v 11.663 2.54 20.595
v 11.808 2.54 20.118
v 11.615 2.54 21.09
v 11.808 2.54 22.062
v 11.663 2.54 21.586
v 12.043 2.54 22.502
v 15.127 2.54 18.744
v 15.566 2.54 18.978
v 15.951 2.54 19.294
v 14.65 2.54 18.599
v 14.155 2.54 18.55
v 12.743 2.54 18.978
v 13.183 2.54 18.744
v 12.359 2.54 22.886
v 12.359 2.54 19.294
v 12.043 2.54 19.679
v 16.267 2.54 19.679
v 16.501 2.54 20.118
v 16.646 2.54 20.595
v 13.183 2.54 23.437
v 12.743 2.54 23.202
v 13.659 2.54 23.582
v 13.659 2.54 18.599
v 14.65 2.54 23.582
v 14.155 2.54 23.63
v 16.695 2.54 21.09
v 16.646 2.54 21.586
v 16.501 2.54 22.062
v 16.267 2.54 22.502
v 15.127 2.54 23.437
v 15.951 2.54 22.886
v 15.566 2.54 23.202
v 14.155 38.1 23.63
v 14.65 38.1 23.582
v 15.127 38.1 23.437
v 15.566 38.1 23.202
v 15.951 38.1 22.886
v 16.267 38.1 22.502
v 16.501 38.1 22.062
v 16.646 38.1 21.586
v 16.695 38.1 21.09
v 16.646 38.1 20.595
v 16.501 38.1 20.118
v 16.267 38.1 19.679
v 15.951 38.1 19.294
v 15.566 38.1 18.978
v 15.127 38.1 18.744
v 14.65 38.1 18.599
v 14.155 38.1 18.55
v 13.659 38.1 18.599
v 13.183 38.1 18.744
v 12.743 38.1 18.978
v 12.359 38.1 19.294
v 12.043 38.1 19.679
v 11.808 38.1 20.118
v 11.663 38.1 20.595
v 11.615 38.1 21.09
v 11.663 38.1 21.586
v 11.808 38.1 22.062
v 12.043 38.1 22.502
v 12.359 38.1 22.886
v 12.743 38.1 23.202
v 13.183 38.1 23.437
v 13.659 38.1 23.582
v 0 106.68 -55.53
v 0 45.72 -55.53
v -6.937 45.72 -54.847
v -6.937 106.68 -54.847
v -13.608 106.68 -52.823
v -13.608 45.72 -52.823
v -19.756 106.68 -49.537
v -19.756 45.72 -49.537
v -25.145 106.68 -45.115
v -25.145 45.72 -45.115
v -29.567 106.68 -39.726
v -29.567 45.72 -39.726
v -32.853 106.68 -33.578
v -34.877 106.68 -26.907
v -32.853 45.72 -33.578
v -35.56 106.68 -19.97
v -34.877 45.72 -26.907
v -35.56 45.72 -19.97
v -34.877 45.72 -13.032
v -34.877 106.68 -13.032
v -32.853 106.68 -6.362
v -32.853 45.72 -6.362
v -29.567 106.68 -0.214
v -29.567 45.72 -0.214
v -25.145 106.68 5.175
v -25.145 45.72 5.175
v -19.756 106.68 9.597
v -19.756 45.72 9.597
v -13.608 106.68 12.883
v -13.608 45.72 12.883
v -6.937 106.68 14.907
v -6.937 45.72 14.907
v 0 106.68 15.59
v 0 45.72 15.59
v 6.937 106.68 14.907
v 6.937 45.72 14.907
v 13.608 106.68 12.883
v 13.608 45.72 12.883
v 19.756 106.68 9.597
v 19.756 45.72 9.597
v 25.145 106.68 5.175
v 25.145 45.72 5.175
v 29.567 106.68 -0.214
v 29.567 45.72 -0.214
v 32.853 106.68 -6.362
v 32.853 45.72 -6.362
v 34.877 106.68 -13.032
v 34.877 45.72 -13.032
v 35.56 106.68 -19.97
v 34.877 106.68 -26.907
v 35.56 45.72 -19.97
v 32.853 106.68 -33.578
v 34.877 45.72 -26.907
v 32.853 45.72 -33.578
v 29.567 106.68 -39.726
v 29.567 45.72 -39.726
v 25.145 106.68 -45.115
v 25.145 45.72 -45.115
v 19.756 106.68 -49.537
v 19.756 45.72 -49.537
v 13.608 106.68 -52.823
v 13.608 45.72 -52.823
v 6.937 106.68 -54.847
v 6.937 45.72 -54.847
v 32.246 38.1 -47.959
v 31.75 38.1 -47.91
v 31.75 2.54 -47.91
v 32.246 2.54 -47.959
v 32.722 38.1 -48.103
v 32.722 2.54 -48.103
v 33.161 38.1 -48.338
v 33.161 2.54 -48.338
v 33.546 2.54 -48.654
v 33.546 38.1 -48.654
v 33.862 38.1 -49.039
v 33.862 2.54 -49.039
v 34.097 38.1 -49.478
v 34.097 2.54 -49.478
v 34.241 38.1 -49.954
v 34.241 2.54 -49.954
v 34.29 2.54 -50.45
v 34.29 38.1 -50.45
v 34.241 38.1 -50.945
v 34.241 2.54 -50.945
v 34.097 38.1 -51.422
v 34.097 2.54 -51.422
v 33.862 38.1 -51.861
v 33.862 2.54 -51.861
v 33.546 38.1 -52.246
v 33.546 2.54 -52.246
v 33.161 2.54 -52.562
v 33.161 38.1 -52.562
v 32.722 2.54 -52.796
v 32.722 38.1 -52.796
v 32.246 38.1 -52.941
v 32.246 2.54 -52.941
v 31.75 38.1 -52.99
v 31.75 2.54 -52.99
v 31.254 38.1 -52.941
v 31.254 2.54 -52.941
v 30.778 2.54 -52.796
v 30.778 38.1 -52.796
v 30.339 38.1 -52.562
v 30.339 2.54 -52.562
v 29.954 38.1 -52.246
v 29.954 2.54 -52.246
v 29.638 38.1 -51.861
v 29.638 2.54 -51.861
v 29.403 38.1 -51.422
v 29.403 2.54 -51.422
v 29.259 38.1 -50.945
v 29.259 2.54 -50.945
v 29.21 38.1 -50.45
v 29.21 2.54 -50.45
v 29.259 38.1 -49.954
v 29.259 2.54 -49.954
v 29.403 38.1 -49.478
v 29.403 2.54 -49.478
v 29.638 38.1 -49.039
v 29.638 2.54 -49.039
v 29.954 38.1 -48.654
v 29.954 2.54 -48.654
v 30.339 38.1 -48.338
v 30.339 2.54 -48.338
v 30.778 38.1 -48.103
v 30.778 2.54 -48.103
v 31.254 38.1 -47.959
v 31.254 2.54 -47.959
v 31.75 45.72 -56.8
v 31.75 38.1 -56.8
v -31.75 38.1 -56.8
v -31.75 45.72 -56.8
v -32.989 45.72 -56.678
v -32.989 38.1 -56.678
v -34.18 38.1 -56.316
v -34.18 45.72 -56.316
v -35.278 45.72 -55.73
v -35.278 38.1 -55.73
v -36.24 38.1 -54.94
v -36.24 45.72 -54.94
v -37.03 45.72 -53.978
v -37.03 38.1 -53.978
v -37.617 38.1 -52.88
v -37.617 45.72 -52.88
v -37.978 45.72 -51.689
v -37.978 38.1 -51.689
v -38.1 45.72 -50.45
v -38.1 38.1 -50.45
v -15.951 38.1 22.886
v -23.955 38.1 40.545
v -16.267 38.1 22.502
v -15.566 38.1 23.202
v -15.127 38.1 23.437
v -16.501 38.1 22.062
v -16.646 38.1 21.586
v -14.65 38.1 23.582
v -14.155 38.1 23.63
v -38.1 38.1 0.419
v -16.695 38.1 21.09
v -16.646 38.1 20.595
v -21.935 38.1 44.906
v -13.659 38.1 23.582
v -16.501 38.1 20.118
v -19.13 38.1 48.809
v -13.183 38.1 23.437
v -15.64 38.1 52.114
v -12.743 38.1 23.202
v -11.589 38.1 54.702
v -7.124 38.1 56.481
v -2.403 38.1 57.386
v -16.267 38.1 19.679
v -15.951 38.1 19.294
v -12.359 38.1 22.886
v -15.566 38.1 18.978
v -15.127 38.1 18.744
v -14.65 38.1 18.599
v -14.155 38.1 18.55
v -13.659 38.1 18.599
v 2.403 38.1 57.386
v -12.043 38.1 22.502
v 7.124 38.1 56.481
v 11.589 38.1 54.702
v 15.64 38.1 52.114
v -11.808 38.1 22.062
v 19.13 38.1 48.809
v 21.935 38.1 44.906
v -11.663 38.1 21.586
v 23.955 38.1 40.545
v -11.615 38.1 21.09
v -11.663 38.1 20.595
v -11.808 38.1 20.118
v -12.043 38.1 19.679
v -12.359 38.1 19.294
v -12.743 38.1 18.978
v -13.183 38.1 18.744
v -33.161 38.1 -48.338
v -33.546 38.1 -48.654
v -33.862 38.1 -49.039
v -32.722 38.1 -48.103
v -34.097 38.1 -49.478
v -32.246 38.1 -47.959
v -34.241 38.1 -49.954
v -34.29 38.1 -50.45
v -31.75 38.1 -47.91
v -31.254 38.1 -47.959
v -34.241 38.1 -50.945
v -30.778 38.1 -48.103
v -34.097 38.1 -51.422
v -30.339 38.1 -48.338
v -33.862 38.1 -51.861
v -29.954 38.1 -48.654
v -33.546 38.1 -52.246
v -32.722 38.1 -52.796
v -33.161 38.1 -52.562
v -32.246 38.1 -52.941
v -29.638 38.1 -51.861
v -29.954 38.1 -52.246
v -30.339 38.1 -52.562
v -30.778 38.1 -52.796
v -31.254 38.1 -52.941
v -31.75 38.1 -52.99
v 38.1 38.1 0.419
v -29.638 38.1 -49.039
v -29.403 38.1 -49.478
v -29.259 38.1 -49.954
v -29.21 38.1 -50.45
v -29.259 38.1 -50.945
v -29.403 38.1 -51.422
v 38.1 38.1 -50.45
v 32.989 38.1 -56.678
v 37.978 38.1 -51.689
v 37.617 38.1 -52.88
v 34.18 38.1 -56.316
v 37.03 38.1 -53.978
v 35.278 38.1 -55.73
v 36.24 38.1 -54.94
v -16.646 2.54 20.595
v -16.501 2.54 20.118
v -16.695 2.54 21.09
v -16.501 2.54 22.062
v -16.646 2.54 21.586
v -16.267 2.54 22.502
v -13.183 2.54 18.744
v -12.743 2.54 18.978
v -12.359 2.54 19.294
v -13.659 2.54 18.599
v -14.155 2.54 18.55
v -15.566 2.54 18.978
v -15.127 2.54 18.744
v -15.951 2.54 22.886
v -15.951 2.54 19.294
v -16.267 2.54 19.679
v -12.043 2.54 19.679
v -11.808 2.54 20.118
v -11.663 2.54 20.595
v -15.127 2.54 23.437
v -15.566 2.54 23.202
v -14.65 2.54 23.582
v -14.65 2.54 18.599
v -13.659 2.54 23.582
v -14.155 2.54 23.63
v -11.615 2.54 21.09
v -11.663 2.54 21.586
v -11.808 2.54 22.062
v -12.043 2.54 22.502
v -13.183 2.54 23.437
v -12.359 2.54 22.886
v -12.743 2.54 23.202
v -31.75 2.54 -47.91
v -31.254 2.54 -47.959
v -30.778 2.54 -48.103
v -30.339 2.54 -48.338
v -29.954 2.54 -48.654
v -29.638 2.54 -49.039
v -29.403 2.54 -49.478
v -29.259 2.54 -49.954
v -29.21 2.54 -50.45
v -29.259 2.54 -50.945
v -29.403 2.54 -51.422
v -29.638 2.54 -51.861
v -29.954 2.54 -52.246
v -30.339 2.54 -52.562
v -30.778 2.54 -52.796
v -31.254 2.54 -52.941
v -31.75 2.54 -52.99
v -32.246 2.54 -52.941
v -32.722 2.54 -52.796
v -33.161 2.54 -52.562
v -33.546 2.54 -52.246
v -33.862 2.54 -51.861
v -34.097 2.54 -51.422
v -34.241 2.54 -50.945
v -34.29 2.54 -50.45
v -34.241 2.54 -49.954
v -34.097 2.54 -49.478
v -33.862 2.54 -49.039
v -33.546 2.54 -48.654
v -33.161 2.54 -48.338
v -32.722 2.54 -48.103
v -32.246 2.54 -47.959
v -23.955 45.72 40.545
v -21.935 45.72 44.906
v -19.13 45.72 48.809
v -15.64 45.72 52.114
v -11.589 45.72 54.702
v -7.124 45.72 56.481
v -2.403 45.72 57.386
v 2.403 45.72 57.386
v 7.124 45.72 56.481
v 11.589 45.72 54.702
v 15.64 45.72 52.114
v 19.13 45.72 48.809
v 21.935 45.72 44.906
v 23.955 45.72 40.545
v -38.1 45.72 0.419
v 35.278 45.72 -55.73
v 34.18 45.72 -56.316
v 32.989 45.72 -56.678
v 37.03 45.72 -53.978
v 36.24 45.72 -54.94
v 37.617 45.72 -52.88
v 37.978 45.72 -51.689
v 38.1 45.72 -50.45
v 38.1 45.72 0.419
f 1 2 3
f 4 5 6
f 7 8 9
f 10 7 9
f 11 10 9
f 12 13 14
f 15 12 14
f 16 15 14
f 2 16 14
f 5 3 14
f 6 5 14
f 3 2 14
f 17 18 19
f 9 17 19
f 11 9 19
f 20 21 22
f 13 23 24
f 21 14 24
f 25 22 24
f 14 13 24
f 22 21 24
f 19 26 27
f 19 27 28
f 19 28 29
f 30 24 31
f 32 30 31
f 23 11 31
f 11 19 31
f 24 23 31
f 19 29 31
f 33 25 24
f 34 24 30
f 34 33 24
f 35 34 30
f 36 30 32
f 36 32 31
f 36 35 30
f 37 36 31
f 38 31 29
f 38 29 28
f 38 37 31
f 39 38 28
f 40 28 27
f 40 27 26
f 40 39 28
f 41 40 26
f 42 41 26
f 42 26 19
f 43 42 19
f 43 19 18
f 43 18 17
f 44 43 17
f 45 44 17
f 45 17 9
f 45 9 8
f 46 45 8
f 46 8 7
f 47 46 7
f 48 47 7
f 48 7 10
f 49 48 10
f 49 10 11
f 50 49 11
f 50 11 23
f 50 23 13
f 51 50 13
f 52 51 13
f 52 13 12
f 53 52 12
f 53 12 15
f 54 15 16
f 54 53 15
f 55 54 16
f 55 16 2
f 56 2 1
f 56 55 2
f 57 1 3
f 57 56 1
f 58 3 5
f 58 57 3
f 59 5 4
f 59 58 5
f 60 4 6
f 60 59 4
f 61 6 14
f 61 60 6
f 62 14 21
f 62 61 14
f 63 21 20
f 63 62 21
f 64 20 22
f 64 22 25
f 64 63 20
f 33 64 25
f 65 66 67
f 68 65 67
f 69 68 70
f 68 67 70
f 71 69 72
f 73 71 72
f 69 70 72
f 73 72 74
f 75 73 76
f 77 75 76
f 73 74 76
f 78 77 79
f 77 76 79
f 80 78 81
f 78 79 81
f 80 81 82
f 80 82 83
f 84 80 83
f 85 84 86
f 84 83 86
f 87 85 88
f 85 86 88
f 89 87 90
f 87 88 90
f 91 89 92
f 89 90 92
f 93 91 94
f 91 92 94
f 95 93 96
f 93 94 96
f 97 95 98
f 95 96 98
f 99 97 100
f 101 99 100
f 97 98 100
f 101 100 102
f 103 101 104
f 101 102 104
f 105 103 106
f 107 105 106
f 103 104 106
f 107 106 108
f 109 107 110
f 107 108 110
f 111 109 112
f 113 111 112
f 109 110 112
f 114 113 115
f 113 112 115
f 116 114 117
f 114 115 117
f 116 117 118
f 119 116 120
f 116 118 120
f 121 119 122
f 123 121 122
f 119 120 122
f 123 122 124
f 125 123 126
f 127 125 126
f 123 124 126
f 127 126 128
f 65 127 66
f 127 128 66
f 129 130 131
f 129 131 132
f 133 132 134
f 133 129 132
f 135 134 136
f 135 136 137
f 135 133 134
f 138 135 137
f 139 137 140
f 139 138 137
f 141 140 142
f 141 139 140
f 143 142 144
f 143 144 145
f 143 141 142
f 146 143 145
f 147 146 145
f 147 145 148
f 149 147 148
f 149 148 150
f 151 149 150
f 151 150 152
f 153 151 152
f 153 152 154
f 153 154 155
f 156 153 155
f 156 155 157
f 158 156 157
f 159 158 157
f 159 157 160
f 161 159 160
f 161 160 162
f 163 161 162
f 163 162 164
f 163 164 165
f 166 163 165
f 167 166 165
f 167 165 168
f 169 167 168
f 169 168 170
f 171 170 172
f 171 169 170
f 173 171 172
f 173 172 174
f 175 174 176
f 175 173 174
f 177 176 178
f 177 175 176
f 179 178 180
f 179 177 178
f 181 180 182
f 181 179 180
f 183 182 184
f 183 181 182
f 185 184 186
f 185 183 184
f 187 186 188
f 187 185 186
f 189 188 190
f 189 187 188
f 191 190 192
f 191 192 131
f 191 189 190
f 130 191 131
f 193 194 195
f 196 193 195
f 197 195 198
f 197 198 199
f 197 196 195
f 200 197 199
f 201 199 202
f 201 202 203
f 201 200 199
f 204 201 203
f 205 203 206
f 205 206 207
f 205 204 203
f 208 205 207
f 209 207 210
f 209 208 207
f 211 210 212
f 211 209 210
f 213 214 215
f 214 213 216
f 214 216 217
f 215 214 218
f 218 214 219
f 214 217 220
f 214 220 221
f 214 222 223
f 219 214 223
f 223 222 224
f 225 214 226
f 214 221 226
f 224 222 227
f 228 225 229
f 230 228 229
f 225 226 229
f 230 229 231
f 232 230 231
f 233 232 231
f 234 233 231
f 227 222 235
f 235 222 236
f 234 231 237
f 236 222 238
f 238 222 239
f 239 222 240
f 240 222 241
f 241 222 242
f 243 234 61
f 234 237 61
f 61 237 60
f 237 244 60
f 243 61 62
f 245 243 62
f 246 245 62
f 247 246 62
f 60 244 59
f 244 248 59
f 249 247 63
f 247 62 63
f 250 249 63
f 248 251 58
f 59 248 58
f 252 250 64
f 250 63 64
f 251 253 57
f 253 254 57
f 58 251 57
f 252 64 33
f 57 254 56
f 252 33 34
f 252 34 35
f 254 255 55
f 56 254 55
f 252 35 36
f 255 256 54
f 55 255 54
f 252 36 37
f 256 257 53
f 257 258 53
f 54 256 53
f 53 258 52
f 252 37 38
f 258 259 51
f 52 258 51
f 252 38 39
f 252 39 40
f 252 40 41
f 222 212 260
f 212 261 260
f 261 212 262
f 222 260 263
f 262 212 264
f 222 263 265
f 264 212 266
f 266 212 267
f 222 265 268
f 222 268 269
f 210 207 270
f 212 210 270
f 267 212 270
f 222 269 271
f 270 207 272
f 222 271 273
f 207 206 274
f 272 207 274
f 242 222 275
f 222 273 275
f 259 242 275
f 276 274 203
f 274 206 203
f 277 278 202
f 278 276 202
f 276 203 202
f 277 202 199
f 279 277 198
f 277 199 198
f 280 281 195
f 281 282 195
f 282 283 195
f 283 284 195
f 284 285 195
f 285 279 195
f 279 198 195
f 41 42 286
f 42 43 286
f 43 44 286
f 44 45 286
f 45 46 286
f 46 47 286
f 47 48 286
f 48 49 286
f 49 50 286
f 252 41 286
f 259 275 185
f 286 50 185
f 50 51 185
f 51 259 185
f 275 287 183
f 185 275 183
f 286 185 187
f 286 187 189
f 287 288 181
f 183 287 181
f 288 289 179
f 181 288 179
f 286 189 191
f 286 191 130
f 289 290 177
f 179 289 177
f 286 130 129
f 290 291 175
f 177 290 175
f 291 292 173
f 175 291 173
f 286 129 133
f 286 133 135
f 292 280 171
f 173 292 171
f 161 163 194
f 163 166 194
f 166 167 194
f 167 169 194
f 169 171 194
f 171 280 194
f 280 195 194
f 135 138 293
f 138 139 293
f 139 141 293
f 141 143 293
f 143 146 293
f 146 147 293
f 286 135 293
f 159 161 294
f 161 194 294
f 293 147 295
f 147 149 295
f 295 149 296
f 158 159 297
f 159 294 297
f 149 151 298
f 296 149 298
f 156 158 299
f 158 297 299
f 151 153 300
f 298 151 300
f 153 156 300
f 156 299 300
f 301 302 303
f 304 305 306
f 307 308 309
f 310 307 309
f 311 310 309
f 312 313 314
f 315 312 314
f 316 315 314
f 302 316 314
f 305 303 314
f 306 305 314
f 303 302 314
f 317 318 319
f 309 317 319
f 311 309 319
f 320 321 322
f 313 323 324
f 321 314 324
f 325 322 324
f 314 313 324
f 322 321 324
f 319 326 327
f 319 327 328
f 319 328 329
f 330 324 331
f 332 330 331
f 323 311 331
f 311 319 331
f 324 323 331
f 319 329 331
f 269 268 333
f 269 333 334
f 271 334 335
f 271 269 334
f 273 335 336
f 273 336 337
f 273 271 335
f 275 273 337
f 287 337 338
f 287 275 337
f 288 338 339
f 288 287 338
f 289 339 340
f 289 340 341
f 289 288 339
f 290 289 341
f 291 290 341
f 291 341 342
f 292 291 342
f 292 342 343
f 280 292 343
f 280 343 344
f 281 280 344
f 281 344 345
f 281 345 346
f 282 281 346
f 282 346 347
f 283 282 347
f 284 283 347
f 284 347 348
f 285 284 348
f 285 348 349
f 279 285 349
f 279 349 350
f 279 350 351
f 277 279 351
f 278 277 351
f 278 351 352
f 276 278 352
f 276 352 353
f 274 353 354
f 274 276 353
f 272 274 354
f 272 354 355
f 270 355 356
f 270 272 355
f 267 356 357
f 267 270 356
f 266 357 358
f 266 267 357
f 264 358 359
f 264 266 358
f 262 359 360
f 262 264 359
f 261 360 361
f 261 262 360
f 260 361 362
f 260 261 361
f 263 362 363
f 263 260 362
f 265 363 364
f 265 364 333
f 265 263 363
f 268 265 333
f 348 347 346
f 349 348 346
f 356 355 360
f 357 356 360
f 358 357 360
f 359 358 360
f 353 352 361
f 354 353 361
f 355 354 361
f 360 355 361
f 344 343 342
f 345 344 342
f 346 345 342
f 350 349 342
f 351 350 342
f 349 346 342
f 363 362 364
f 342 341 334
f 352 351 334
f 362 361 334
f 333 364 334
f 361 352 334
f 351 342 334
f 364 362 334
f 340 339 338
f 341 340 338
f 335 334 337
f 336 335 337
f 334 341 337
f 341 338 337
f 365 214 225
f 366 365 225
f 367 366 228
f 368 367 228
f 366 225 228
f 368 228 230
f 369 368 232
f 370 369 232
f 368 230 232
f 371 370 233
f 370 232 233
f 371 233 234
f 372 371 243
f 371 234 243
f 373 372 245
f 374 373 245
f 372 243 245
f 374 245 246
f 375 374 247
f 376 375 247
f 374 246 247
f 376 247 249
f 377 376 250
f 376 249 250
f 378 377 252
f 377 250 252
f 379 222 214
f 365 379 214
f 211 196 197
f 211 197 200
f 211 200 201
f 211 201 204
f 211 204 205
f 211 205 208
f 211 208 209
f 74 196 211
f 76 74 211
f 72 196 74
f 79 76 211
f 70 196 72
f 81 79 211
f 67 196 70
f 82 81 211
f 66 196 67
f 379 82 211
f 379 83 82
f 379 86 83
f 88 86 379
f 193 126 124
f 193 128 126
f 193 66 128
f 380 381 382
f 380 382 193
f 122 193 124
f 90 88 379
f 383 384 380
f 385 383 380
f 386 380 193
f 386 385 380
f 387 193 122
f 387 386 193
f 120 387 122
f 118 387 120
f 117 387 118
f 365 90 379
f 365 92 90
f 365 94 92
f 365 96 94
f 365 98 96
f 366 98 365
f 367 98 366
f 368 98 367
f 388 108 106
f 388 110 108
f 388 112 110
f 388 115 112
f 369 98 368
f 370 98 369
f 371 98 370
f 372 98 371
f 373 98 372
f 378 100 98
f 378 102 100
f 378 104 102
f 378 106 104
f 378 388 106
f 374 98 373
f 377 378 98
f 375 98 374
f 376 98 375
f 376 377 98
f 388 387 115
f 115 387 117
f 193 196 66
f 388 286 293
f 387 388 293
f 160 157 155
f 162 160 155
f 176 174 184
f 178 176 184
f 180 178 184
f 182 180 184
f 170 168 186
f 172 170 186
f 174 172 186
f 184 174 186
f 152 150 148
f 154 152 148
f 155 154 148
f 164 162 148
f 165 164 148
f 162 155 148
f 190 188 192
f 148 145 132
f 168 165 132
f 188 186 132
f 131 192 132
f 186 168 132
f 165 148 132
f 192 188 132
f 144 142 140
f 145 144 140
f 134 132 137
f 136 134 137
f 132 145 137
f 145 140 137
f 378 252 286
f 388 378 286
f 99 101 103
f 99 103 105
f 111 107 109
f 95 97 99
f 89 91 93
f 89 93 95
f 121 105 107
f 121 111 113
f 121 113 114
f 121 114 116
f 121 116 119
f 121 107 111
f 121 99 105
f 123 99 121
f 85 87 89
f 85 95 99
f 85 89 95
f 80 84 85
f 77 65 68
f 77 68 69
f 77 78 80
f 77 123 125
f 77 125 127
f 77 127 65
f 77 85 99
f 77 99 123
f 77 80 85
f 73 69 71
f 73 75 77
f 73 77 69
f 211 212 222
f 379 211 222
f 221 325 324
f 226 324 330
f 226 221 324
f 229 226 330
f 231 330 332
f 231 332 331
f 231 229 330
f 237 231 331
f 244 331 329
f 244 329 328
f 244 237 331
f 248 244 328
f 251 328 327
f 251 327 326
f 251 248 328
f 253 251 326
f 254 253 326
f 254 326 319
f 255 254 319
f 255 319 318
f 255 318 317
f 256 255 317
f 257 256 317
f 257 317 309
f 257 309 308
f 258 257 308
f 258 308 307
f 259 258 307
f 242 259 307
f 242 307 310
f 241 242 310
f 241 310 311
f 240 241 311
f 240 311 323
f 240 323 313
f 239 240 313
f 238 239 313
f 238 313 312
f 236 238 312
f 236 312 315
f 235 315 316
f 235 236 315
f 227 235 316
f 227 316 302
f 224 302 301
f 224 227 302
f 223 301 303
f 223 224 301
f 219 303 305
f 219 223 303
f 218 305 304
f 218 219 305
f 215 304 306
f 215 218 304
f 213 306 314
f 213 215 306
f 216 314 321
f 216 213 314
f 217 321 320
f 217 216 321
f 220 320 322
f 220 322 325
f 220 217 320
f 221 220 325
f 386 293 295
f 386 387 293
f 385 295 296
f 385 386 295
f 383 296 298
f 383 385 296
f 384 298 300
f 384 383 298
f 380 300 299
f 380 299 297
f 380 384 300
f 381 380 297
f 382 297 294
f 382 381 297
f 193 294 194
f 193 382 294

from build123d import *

# Parameters (mm, degrees)
BOSS_EXTRUDE1_START = 38.1
BOSS_EXTRUDE1_DEPTH = 7.62
FILLET1_R           = 6.35
SKETCH3_R           = 2.54
BOSS_EXTRUDE2_DEPTH = 43.18
SKETCH4_R           = 35.56
BOSS_EXTRUDE3_DEPTH = 60.96


with BuildPart() as part:
    # Sketch1 → Boss-Extrude1 (new body)
    with BuildSketch(Plane(origin=(0, 0, 0), x_dir=(1, 0, 0), z_dir=(0, 1, 0)).offset(BOSS_EXTRUDE1_START)):
        with BuildLine():
            Line((-38.1, -0.419392835), (-23.955144175, -40.544743901))
            ThreePointArc((-23.955144175, -40.544743901), (0, -57.500155839), (23.955144175, -40.544743901))
            Line((23.955144175, -40.544743901), (38.1, -0.419392835))
            Line((38.1, -0.419392835), (38.1, 56.799844161))
            Line((38.1, 56.799844161), (-38.1, 56.799844161))
            Line((-38.1, 56.799844161), (-38.1, -0.419392835))
        make_face()
    extrude(amount=BOSS_EXTRUDE1_DEPTH)

    # Fillet1
    fillet1_edges = [part.edges().sort_by_distance(p)[0] for p in [
        (-38.1, 41.91, -56.799844161),
        (38.1, 41.91, -56.799844161),
    ]]
    fillet(fillet1_edges, radius=FILLET1_R)

    # Sketch3 → Boss-Extrude2 (add)
    with BuildSketch(Plane(origin=(0, 45.72, 0), x_dir=(1, 0, 0), z_dir=(0, 1, 0))):
        with Locations(Location((-31.75, 50.449844161, 0), (0, 0, 270))):
            Circle(SKETCH3_R)
        with Locations(Location((31.75, 50.449844161, 0), (0, 0, 270))):
            Circle(SKETCH3_R)
        with Locations(Location((-14.154646808, -21.090423745, 0), (0, 0, 270))):
            Circle(SKETCH3_R)
        with Locations(Location((14.154646808, -21.090423745, 0), (0, 0, 270))):
            Circle(SKETCH3_R)
    extrude(amount=-BOSS_EXTRUDE2_DEPTH)

    # Sketch4 → Boss-Extrude3 (add)
    with BuildSketch(Plane(origin=(0, 45.72, 0), x_dir=(1, 0, 0), z_dir=(0, 1, 0))):
        with Locations(Location((0, 19.969844161, 0), (0, 0, 90))):
            Circle(SKETCH4_R)
    extrude(amount=BOSS_EXTRUDE3_DEPTH)


solid = part.part
